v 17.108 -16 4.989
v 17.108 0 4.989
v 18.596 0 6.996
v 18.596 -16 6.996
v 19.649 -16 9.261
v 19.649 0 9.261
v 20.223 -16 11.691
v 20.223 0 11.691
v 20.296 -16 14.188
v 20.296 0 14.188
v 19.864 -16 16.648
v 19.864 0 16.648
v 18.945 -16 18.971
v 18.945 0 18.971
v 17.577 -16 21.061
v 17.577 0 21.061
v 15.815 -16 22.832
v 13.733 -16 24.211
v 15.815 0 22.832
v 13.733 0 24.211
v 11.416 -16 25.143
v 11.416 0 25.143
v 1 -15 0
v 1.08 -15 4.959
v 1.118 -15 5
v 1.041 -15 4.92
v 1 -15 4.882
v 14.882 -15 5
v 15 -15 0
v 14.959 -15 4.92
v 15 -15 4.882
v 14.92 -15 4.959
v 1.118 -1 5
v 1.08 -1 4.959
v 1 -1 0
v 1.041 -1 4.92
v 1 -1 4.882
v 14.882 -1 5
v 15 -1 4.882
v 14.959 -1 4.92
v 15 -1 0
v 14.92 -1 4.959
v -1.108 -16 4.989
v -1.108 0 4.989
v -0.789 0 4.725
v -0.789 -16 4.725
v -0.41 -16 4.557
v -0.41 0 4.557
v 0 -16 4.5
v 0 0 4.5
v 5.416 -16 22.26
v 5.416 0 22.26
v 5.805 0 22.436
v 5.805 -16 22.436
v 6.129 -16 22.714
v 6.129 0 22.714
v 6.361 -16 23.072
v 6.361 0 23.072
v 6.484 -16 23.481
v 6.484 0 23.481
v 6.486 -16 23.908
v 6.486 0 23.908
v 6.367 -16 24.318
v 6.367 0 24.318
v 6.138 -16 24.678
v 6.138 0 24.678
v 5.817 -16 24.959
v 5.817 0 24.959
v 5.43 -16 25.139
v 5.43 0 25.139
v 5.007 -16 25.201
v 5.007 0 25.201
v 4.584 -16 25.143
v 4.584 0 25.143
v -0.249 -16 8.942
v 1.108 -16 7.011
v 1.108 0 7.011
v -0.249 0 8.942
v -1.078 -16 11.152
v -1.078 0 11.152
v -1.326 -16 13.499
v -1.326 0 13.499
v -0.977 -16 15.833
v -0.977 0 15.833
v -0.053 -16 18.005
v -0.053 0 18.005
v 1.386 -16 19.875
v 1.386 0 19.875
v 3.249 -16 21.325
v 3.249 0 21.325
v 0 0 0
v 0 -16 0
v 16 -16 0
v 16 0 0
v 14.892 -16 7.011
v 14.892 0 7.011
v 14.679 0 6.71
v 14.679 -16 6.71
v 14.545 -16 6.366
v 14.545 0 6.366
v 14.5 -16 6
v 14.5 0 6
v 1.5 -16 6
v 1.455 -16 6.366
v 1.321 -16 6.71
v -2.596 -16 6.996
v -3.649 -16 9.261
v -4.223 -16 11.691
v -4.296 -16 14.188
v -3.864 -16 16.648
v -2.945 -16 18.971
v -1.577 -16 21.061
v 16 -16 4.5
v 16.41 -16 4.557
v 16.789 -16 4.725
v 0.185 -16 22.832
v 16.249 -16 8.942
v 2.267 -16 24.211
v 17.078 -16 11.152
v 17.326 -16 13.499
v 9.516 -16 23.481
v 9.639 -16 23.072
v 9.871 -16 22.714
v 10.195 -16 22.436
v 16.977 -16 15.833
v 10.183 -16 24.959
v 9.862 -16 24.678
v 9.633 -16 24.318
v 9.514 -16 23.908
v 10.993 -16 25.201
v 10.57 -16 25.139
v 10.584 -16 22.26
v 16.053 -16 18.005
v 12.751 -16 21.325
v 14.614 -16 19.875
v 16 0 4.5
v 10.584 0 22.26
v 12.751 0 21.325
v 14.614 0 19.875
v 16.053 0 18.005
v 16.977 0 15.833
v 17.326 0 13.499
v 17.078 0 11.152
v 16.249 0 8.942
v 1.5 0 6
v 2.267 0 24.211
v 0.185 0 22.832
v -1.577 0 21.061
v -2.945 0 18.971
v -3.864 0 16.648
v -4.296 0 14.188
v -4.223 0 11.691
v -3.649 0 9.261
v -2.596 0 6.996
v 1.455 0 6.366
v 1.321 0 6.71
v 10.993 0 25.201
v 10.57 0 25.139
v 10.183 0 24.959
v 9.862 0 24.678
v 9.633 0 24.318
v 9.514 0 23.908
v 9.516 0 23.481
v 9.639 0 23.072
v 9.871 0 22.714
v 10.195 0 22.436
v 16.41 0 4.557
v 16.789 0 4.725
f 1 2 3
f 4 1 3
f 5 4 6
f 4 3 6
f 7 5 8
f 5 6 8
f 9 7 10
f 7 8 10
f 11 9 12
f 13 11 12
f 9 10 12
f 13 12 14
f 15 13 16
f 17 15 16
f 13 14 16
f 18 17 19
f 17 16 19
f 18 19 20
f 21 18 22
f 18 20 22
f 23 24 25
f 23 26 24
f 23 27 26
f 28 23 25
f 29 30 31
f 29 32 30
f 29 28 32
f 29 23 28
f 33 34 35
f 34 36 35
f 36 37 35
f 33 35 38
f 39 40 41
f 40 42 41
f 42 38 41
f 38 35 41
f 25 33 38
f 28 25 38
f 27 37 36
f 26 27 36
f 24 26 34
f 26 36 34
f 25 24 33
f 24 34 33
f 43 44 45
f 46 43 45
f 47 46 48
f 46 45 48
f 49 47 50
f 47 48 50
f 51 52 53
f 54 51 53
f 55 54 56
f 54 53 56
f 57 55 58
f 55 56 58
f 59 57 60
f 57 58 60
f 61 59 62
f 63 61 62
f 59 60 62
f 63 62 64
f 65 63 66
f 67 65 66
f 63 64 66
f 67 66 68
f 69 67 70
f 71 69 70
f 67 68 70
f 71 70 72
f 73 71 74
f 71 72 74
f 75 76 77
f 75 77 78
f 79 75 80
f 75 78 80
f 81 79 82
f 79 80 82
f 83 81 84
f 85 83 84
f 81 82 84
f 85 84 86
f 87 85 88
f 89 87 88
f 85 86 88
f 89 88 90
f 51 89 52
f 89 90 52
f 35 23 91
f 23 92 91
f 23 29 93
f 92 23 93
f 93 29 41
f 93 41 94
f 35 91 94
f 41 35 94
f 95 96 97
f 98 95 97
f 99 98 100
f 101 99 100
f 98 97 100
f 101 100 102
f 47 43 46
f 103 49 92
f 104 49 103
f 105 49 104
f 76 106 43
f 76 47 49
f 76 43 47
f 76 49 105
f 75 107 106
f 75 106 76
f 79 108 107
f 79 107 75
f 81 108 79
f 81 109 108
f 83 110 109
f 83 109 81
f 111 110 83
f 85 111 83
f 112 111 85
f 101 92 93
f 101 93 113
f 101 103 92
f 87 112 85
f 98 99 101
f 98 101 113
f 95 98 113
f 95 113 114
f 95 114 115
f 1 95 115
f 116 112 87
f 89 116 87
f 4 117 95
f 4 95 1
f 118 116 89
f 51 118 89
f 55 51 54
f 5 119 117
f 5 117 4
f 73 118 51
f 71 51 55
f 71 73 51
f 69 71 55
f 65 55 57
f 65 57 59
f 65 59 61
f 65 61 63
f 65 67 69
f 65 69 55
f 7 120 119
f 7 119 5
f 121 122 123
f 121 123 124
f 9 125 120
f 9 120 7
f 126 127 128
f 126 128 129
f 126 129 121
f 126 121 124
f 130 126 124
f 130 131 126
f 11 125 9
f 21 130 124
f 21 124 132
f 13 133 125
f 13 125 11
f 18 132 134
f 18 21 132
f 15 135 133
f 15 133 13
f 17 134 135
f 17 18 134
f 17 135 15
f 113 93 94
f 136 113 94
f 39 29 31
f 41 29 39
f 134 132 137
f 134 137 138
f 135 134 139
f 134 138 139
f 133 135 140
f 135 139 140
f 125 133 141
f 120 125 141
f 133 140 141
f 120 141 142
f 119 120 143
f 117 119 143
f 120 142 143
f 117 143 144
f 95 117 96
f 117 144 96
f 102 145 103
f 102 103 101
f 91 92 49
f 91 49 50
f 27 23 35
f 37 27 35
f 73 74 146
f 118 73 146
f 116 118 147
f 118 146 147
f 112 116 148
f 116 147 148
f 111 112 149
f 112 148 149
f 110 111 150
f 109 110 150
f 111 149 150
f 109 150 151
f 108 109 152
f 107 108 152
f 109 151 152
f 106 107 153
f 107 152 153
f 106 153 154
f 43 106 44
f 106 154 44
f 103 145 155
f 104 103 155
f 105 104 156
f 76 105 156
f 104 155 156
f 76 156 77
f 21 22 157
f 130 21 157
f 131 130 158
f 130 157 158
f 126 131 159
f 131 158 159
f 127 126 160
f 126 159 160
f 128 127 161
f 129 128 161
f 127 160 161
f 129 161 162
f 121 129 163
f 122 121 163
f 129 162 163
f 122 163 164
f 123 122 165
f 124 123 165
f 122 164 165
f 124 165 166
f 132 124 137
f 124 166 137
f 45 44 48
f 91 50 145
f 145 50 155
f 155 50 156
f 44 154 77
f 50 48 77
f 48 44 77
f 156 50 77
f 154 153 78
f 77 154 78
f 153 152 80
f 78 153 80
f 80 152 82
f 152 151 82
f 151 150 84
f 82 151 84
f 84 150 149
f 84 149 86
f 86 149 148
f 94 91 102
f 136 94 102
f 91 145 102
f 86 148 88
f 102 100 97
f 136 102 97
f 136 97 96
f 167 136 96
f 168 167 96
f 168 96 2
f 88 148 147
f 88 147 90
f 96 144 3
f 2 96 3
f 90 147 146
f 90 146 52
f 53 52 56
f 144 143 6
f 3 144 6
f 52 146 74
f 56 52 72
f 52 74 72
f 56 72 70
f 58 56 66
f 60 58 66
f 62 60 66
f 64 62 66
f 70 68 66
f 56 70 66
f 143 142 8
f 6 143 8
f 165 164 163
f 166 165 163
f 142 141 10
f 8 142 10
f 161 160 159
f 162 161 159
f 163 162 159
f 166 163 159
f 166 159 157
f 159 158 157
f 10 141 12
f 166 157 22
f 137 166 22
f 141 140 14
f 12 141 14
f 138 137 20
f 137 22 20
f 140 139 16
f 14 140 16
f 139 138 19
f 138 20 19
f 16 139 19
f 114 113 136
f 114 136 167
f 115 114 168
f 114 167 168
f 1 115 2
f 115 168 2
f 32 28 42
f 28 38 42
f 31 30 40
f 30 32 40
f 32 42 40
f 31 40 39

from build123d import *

# Parameters (mm, degrees)
F0_W     = 16
F0_H     = 16
F1_DEPTH = 6
F2_T     = -1
F4_DEPTH = 16


with BuildPart() as f1:
    # F0 (on Top) → F1 (new body)
    with BuildSketch(Plane.XY):
        with Locations((8, -8)):
            Rectangle(F0_W, F0_H)
    extrude(amount=F1_DEPTH)

    # F2
    f2_openings = [f1.faces().sort_by_distance(p)[0] for p in [
        (8, -8, 0),
    ]]
    offset(amount=F2_T, openings=f2_openings)

    # F3 (on Front) → F4 (join)
    with BuildSketch(Plane.XZ):
        with BuildLine():
            ThreePointArc((14.891778, 7.010863), (14.989137, 4.891778), (17.108222, 4.989137))
            ThreePointArc((17.108222, 4.989137), (19.863955, 16.648312), (11.415583, 25.142748))
            ThreePointArc((11.415583, 25.142748), (9.558719, 24.11705), (10.584417, 22.260186))
            ThreePointArc((10.584417, 22.260186), (16.976916, 15.832832), (14.891778, 7.010863))
        make_face()
        with BuildLine():
            ThreePointArc((4.584417, 25.142748), (-3.863955, 16.648312), (-1.108222, 4.989137))
            ThreePointArc((-1.108222, 4.989137), (1.010863, 4.891778), (1.108222, 7.010863))
            ThreePointArc((1.108222, 7.010863), (-0.976916, 15.832832), (5.415583, 22.260186))
            ThreePointArc((5.415583, 22.260186), (6.441281, 24.11705), (4.584417, 25.142748))
        make_face()
    extrude(amount=F4_DEPTH)


solid = f1.part
